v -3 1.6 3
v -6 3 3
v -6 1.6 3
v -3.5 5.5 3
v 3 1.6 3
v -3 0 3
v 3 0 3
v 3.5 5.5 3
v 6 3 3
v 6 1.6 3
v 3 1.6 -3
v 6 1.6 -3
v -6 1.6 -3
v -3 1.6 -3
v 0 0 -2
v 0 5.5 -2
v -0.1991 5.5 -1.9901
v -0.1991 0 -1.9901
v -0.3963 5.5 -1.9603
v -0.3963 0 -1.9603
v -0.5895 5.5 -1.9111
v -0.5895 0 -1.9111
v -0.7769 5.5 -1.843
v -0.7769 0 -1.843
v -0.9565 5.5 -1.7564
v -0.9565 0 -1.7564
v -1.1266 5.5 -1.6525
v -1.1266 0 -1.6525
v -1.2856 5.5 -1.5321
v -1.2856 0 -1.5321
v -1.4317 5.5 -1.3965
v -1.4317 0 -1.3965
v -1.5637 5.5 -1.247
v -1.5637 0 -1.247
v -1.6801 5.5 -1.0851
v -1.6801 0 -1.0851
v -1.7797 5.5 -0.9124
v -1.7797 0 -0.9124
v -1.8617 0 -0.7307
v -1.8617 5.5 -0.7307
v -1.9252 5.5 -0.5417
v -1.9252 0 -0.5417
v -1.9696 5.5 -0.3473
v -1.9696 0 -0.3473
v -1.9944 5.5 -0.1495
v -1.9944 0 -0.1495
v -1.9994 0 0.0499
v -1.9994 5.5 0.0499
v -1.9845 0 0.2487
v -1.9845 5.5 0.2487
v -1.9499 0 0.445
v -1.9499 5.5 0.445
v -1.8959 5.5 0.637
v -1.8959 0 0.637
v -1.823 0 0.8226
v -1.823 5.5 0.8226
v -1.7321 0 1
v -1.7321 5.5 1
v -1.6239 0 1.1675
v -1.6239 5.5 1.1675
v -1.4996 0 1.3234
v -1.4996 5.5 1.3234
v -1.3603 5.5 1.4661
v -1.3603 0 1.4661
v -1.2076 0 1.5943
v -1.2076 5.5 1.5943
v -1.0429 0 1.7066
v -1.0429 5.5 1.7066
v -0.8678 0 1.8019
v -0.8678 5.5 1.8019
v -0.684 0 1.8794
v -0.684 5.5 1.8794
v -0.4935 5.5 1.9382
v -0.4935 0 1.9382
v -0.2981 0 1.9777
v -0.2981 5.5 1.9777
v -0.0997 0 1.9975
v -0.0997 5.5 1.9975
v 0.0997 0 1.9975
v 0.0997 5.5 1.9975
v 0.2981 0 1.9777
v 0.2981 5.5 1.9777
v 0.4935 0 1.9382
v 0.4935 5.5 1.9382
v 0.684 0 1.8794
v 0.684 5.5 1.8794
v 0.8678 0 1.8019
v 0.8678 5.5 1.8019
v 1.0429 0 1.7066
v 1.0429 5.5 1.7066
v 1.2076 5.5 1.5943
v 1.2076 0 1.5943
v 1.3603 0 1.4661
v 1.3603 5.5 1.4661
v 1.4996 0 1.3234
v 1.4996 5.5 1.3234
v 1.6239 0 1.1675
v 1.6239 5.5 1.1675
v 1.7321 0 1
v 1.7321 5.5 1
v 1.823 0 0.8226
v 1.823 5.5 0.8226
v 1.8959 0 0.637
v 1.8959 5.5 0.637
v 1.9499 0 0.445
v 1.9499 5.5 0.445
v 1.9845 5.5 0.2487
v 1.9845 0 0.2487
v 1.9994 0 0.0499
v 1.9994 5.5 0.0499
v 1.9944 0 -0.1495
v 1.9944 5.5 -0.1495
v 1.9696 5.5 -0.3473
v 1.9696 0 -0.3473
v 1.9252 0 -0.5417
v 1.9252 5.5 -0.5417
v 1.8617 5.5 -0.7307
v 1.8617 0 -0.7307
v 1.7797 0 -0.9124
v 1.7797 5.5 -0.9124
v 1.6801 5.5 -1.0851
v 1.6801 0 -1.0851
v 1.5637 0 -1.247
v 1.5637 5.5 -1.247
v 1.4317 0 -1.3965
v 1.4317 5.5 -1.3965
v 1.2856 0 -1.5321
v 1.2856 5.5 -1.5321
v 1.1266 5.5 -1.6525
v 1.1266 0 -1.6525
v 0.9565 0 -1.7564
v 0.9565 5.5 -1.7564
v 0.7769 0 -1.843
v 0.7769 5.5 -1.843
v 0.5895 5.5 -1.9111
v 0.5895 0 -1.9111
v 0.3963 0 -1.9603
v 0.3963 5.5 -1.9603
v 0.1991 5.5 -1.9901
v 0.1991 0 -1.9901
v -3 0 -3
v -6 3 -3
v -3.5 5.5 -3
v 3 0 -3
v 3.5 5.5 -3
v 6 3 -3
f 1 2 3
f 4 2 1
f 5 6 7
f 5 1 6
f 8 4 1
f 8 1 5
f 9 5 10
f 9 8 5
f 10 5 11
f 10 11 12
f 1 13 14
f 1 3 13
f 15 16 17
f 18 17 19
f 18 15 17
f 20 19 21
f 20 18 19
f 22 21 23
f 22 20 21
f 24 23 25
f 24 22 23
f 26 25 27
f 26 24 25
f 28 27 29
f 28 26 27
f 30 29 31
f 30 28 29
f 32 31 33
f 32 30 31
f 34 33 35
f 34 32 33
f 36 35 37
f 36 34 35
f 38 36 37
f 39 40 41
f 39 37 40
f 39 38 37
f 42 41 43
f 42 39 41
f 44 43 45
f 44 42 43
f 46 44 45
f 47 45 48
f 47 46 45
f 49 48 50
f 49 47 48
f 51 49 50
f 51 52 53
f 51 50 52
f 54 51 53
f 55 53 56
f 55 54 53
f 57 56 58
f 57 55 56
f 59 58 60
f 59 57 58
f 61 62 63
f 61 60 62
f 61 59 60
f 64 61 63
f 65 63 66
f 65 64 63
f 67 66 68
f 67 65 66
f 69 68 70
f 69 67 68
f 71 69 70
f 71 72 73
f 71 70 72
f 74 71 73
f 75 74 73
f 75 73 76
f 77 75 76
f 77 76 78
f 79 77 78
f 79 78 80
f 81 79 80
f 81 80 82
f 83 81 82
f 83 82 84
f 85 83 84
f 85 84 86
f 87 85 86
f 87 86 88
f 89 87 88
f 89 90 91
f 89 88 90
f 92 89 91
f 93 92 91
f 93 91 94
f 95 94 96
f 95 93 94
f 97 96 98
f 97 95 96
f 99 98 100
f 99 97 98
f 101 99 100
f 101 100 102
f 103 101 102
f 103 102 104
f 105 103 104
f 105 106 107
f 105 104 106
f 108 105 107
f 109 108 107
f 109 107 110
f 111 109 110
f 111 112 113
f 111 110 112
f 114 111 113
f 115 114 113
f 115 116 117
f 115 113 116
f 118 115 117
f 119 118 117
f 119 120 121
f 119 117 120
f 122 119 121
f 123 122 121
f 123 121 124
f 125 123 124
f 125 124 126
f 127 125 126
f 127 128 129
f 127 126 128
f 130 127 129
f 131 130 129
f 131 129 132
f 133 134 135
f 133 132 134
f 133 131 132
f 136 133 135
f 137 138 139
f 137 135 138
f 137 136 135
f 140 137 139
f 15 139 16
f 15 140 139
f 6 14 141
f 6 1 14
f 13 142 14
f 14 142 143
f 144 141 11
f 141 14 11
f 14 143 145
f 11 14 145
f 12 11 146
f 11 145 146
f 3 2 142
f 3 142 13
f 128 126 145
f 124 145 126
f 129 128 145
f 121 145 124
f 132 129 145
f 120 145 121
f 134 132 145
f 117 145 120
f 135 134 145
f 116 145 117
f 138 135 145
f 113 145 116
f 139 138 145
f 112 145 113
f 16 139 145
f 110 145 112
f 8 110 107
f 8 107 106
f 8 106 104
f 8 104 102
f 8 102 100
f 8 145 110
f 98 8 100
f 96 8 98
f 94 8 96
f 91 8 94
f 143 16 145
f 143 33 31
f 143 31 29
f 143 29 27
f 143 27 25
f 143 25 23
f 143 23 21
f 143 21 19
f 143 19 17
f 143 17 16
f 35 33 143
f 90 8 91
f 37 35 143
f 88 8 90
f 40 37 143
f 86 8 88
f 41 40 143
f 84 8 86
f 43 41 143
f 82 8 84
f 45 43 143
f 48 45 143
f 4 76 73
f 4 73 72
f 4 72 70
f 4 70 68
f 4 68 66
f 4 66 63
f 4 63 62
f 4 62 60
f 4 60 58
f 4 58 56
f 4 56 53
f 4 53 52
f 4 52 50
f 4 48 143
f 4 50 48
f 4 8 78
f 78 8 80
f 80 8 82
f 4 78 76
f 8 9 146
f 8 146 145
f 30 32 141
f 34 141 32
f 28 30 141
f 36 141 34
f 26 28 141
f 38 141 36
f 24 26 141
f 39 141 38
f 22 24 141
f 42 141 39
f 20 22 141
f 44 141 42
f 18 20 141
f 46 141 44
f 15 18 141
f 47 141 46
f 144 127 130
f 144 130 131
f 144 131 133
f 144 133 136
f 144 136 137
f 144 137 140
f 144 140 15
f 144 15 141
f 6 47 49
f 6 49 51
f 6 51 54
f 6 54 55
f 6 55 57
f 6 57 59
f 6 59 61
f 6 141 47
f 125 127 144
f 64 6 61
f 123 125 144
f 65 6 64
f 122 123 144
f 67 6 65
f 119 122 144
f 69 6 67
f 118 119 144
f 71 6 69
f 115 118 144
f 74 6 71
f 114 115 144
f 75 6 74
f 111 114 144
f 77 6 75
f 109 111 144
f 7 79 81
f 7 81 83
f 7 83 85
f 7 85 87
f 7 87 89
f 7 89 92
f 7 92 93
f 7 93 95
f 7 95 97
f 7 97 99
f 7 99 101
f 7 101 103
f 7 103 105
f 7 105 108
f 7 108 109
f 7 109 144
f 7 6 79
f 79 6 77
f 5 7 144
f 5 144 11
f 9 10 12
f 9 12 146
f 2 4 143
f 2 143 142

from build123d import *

# Parameters (mm, degrees)
EXTRUDE1_DEPTH     = 3
CUT_EXTRUDE1_REACH = 10.675
SKETCH2_R          = 2


with BuildPart() as part:
    # Sketch1 → Extrude1 (new, symmetric)
    with BuildSketch(Plane.XY):
        Polygon((-3, 0), (3, 0), (3, 1.6), (6, 1.6), (6, 3), (3.5, 5.5), (-3.5, 5.5), (-6, 3), (-6, 1.6), (-3, 1.6), align=None)
    extrude(amount=EXTRUDE1_DEPTH, both=True)

    # Sketch2 → Cut-Extrude1 (cut, up to next)
    with BuildSketch(Plane(origin=(0, 0, 0), x_dir=(1, 0, 0), z_dir=(0, 1, 0)), mode=Mode.PRIVATE) as cut_extrude1_sk1:
        with Locations(Location((0, 0, 0), (0, 0, 90))):
            Circle(SKETCH2_R)
    cut_extrude1_tool1 = extrude(cut_extrude1_sk1.sketch, amount=CUT_EXTRUDE1_REACH, mode=Mode.PRIVATE) & part.part
    add(cut_extrude1_tool1.solids().sort_by_distance((0, 0, 0))[0], mode=Mode.SUBTRACT)


solid = part.part
